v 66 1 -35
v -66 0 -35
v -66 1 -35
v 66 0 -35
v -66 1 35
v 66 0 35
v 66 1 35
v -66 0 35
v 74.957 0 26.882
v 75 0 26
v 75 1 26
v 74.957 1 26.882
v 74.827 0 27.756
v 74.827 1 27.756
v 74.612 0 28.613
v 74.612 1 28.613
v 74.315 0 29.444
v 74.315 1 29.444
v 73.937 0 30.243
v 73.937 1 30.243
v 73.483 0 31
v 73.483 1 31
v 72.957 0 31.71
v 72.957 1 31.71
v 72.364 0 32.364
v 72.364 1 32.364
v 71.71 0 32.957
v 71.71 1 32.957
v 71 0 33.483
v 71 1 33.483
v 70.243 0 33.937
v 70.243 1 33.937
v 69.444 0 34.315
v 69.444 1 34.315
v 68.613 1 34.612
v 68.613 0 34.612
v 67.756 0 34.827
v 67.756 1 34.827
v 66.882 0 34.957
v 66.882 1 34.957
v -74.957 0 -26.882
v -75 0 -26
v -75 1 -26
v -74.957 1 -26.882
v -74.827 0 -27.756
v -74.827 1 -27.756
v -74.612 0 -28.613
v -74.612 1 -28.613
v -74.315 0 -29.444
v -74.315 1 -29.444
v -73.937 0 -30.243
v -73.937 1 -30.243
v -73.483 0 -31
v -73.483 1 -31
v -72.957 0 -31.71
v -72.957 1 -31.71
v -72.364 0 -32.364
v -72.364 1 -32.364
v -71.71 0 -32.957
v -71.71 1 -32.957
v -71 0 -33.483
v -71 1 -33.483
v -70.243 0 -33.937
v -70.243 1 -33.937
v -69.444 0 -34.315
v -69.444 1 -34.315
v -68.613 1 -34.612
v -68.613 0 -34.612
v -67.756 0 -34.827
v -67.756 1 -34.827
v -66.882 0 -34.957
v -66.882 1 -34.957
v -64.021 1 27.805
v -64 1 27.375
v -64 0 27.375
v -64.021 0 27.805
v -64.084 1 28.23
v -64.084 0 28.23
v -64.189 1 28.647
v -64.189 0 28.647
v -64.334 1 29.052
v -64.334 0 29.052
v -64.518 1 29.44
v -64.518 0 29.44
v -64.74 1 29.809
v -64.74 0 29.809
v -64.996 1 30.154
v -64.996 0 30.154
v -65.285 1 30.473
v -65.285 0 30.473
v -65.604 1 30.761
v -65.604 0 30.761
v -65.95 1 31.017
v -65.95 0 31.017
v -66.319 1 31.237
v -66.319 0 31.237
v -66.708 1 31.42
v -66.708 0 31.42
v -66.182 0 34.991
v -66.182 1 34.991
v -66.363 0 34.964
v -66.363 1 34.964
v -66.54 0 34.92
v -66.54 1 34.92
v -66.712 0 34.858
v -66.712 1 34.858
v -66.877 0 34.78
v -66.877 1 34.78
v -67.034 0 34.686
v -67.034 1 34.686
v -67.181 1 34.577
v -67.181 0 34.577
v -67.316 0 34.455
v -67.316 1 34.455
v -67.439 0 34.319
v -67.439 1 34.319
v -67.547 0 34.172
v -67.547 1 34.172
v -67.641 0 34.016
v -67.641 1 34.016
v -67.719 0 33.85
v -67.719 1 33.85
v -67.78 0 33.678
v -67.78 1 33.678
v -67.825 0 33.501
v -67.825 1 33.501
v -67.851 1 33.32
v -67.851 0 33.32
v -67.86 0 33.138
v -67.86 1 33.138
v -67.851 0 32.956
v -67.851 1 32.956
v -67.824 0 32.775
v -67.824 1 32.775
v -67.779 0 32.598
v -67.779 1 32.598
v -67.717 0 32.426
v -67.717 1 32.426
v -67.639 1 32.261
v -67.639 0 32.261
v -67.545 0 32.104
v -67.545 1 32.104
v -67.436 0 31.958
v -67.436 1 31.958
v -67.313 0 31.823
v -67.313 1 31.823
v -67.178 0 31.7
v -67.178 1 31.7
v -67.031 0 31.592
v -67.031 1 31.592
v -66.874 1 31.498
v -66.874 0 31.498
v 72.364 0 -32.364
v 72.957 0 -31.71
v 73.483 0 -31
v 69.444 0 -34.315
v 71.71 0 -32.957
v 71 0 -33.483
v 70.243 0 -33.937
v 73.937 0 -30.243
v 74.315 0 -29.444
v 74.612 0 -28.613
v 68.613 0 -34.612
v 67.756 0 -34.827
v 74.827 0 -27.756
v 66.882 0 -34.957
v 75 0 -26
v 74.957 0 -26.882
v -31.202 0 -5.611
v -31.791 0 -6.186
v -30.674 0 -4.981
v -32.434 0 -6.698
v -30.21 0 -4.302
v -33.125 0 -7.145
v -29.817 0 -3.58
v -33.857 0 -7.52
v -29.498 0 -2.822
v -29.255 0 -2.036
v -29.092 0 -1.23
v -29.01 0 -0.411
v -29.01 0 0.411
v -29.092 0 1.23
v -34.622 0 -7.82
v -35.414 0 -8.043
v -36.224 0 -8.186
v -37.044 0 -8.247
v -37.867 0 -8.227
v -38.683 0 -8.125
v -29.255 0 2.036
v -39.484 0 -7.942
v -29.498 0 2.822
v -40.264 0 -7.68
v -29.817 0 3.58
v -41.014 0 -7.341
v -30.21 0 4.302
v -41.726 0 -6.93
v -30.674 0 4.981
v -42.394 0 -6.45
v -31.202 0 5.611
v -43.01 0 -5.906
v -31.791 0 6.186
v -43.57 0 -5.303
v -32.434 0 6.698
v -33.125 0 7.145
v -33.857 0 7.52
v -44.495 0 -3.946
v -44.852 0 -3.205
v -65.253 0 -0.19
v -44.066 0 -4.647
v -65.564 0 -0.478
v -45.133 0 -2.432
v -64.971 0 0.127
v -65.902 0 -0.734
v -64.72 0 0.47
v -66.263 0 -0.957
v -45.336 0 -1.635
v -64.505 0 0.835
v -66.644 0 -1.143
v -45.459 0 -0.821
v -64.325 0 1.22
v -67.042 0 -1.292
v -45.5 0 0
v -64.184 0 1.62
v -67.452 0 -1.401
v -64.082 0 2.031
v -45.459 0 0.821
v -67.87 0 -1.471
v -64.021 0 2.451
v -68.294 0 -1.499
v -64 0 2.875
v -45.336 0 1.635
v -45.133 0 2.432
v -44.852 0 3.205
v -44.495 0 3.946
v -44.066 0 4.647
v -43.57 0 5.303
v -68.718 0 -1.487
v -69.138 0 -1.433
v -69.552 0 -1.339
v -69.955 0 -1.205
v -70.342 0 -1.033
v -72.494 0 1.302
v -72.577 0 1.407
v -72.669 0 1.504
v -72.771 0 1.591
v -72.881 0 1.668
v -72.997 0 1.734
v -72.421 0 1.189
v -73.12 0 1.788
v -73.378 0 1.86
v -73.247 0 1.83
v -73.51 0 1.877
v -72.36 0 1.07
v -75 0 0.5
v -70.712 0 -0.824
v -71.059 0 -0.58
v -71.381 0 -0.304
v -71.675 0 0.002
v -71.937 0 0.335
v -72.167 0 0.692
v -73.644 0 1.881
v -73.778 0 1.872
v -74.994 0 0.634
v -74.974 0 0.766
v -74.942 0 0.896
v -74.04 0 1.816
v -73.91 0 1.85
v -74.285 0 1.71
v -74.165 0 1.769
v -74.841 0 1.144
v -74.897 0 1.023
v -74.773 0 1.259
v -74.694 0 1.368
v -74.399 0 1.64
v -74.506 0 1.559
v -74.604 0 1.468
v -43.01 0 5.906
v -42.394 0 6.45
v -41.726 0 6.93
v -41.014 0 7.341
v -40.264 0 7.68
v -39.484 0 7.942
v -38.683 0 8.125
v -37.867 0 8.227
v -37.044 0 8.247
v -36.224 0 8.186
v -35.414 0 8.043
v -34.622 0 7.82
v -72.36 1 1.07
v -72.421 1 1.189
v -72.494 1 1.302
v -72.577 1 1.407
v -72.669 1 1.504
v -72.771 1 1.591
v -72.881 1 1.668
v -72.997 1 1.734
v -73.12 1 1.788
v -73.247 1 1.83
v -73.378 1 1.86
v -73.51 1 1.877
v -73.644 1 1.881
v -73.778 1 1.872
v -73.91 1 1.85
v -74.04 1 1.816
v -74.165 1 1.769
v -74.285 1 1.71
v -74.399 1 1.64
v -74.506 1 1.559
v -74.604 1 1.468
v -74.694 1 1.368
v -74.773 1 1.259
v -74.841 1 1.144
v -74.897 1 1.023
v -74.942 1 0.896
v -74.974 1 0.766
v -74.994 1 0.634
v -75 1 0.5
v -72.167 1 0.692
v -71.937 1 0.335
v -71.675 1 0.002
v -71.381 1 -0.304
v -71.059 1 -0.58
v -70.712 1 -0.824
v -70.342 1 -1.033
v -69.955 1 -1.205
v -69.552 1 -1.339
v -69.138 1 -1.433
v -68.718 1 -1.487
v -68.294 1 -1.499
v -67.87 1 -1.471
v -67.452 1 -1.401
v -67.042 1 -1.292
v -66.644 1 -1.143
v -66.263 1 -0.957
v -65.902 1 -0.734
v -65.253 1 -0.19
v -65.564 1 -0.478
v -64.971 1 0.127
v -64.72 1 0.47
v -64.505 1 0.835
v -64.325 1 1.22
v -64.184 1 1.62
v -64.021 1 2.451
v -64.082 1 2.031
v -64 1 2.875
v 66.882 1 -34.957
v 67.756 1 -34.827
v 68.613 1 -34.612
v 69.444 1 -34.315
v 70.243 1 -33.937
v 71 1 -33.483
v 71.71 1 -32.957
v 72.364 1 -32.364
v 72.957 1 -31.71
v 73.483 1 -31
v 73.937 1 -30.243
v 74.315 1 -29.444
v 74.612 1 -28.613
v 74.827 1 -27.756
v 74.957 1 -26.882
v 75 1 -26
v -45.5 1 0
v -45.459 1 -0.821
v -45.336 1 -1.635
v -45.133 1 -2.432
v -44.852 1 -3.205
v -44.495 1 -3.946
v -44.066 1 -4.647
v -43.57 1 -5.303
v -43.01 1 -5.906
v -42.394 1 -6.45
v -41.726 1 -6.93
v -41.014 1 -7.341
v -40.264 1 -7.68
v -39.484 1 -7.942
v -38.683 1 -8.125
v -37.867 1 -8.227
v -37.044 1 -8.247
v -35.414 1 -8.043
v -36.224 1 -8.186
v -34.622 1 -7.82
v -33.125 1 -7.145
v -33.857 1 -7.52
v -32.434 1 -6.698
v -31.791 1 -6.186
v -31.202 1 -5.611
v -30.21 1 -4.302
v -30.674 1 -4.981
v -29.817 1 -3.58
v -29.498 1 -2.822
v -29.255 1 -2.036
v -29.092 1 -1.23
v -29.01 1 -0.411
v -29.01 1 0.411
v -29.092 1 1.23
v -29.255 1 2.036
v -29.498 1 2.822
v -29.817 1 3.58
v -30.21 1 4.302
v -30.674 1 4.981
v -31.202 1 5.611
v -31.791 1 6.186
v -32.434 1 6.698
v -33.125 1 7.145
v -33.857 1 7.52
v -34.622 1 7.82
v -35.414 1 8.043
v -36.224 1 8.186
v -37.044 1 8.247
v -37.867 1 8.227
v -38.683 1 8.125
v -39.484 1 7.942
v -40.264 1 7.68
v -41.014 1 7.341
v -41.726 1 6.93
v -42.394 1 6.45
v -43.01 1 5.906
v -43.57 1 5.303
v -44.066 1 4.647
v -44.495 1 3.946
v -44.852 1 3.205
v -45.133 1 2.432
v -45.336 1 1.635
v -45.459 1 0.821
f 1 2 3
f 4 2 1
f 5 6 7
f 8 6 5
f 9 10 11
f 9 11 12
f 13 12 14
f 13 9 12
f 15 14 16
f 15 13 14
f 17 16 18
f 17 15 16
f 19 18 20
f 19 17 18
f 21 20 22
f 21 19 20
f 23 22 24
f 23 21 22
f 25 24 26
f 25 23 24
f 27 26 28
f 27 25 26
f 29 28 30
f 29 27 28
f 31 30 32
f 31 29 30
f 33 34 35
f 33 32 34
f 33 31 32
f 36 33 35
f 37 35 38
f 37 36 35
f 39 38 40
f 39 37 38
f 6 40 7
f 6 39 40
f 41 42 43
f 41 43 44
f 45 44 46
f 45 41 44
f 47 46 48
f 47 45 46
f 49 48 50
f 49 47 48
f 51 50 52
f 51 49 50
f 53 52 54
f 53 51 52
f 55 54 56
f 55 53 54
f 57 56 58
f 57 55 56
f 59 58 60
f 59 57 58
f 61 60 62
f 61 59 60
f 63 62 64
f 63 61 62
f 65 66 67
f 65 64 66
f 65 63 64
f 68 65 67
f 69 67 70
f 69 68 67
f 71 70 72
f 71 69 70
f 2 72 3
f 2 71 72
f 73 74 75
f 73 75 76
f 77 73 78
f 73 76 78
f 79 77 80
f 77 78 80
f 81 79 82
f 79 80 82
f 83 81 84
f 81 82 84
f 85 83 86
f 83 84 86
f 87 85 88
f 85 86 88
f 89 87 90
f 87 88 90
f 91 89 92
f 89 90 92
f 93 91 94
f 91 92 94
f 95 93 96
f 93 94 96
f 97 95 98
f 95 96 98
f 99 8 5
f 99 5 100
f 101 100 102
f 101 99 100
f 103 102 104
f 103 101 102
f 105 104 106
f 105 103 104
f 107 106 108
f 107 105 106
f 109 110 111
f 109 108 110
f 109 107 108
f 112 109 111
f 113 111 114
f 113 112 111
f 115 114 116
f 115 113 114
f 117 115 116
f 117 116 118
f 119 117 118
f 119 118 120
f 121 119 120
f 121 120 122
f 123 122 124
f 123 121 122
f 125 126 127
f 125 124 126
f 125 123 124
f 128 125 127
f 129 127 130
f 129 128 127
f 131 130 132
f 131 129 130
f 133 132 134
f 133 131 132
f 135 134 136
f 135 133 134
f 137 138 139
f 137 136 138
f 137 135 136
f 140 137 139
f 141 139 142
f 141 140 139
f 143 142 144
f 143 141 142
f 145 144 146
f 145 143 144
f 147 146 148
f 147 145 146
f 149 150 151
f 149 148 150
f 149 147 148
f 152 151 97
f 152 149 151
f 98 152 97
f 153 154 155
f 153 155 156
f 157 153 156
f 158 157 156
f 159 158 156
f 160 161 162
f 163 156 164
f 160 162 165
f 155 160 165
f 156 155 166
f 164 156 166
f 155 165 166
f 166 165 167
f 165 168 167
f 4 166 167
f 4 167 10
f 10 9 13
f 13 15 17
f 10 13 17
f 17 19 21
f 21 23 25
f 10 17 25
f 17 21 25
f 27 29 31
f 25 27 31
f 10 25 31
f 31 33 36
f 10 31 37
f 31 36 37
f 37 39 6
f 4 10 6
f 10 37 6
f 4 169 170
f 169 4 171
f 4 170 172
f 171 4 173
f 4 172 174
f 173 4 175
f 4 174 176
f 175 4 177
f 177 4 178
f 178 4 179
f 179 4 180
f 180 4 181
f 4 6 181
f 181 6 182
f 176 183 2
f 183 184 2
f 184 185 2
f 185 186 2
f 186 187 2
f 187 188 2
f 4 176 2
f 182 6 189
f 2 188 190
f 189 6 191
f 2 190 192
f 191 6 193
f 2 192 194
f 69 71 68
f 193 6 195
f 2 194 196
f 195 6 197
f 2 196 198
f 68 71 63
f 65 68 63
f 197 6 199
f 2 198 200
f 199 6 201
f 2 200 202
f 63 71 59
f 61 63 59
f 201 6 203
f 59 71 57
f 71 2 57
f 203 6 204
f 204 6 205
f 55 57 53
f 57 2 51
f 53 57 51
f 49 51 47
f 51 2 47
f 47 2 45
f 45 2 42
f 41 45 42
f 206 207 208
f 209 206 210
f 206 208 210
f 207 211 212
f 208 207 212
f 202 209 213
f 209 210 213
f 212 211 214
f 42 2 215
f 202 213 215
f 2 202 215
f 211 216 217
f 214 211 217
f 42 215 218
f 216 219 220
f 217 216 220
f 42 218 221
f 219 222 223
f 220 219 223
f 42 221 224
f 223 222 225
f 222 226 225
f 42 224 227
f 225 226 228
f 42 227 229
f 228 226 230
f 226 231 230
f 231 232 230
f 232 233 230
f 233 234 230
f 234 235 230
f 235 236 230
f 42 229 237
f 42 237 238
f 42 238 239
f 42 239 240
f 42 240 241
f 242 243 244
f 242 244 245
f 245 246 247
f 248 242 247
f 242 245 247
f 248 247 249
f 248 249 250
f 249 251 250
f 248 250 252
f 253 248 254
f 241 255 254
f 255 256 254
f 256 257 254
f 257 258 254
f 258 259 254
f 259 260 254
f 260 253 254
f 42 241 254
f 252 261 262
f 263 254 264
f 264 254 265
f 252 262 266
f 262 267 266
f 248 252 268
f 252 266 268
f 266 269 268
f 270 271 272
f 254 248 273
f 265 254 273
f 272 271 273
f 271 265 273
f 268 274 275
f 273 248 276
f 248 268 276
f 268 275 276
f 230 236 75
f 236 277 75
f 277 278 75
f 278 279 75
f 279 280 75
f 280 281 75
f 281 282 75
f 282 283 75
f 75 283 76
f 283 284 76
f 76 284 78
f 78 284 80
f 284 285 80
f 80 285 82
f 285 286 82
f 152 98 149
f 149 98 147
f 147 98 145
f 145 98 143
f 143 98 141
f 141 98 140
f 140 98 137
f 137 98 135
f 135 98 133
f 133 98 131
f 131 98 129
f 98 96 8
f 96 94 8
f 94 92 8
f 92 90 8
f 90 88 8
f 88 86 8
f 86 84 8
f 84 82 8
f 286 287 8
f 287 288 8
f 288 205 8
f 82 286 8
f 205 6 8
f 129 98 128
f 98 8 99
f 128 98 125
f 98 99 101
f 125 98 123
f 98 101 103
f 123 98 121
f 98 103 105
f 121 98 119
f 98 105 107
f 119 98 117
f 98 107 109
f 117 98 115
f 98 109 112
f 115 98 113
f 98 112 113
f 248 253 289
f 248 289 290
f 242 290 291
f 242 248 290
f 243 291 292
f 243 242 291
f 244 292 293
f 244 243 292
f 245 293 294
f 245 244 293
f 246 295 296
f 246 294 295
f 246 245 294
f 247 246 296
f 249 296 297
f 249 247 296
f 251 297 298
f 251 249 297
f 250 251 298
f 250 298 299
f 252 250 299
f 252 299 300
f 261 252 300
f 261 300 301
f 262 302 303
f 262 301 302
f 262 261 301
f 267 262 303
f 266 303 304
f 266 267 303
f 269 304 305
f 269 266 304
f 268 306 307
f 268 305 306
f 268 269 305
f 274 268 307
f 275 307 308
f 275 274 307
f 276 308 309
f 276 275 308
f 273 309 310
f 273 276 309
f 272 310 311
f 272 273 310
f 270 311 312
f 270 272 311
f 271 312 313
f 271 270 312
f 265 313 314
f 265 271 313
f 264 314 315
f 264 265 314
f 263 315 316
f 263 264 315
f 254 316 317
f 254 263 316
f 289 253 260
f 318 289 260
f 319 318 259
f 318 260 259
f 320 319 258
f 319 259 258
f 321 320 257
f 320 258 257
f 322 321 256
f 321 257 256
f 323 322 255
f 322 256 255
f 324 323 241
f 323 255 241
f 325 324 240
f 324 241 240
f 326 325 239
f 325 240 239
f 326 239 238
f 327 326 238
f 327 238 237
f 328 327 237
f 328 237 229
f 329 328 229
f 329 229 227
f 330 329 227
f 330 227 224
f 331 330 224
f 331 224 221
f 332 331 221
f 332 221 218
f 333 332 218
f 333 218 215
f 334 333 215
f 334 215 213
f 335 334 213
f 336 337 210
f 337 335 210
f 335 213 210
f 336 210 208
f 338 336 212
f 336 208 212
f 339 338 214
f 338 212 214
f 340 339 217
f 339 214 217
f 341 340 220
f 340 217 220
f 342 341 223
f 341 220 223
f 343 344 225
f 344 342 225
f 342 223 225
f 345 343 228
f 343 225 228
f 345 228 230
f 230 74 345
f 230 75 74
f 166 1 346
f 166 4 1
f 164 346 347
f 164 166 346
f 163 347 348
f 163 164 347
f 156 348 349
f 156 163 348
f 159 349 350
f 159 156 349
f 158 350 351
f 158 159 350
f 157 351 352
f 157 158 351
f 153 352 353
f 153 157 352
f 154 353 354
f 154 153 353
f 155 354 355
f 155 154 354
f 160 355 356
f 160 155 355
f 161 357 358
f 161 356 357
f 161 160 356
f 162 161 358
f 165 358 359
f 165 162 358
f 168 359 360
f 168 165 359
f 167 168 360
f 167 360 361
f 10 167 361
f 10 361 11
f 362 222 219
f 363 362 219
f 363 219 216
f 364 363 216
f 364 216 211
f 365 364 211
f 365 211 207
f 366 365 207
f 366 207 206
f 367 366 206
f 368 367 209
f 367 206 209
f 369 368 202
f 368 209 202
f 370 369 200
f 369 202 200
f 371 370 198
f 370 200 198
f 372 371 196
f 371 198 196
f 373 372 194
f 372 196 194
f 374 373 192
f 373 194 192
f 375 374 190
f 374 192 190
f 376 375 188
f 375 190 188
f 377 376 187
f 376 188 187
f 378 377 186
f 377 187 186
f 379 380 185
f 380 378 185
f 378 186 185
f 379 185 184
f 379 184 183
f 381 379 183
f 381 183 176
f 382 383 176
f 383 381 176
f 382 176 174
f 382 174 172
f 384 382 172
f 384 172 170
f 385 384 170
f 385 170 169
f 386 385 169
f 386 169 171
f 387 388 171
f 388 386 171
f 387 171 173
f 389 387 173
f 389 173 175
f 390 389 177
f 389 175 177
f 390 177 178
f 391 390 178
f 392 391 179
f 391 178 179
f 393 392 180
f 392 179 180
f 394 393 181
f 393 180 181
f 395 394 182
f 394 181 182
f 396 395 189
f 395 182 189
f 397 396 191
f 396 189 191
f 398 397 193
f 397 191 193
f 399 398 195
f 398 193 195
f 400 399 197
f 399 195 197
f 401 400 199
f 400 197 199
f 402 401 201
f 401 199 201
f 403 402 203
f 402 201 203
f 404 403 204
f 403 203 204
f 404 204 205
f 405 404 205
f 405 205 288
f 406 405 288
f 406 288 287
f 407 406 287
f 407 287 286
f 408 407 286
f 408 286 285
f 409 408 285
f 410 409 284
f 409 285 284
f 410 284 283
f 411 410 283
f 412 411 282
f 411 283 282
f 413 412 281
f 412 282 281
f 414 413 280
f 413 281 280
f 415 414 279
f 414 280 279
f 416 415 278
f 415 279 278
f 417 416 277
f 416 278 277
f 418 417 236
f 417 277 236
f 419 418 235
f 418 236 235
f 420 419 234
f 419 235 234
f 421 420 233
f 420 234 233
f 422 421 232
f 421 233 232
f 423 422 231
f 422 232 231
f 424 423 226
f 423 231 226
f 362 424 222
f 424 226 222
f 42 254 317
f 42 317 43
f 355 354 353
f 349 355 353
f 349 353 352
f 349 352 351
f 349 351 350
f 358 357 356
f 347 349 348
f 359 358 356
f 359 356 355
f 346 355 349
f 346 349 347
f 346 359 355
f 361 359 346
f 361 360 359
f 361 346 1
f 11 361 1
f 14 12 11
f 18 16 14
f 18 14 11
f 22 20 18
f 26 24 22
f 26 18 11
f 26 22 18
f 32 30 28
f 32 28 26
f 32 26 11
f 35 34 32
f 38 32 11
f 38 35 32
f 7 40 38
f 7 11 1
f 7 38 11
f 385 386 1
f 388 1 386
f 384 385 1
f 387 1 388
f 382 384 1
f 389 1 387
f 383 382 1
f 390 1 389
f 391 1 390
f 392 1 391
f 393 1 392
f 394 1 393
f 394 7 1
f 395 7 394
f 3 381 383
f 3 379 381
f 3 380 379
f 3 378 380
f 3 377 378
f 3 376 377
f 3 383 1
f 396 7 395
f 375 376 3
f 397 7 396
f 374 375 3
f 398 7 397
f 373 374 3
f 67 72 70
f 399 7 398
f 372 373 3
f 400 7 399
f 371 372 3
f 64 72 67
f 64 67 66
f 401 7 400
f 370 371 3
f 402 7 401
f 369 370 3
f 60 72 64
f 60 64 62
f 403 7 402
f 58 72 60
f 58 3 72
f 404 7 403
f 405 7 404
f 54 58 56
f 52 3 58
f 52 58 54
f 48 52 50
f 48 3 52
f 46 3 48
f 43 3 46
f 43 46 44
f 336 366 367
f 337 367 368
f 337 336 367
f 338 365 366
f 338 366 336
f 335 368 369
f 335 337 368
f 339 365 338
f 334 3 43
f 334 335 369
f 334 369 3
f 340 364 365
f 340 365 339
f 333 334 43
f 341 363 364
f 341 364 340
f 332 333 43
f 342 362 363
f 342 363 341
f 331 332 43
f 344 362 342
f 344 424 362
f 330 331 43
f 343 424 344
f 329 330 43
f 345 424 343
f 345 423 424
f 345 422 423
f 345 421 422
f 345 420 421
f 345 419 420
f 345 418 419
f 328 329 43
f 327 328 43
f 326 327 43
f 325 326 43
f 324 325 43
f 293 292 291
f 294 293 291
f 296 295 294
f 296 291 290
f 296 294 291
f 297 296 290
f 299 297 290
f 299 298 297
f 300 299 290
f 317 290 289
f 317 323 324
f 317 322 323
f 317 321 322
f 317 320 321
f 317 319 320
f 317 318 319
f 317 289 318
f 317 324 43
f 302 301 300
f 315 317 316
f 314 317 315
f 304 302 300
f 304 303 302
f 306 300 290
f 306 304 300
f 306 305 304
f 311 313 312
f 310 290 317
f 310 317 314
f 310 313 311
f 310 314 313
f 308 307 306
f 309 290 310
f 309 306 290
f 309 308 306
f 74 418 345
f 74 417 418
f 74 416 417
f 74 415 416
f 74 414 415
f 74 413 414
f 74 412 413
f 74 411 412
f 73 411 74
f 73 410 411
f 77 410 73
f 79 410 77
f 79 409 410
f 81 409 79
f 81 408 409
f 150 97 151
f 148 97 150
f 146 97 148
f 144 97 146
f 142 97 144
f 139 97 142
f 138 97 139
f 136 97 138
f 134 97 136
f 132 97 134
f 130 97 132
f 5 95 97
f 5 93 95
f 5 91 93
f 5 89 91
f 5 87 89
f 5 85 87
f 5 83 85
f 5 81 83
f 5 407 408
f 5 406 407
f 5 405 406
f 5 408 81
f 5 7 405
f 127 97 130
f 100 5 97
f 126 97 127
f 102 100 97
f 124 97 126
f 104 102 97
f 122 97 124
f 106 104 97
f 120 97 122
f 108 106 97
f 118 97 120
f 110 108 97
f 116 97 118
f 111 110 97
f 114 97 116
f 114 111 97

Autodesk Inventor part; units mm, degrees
ref_plane "YZ Plane" through (0, 0, 0) normal (1, 0, 0) x (0, 1, 0)
ref_plane "XZ Plane" through (0, 0, 0) normal (0, 1, 0) x (-1, 0, 0)
ref_plane "XY Plane" through (0, 0, 0) normal (0, 0, 1) x (1, 0, 0)
sketch "Sketch1" plane through (0, 0, 0) normal (0, 1, 0) x (-1, 0, 0)
  line L0 (-75, 35) -> (-66, 35) construction
  line L1 (75, 35) -> (75, 26) construction
  line L2 (75, -35) -> (66, -35) construction
  line L3 (-75, -35) -> (-75, -26) construction
  line L4 (-75, 35) -> (75, -35) construction
  line L5 (75, 35) -> (-75, -35) construction
  arc A0 (75, 26) -> (66, 35) centre (66, 26) ccw construction
  arc A1 (66, -35) -> (75, -26) centre (66, -26) ccw
  arc A2 (-75, -26) -> (-66, -35) centre (-66, -26) ccw
  arc A3 (-66, 35) -> (-75, 26) centre (-66, 26) ccw
  line L6 (75, 26) -> (75, 0.5) construction
  line L7 (66, 35) -> (75, 35) construction
  line L8 (-66, 35) -> (66, 35)
  line L9 (-75, 26) -> (-75, 35) construction
  line L10 (-75, -26) -> (-75, 26)
  line L11 (-66, -35) -> (-75, -35) construction
  line L12 (66, -35) -> (-66, -35)
  line L13 (75, -26) -> (75, -35) construction
  circle A4 centre (37.25, 0) radius 8.25
  line L14 (64, 27.375) -> (64, 2.875)
  arc A5 (66.7085, 31.4202) -> (66, 35) centre (66, 33.14) ccw
  arc A6 (64, 2.875) -> (72.3603, 1.0699) centre (68.375, 2.875) ccw
  arc A7 (75, 0.5) -> (72.3603, 1.0699) centre (73.6186, 0.5) ccw
  line L15 (66, 35) -> (66, 35) construction
  line L16 (75, 0.5) -> (75, -26)
  arc A8 (66.7085, 31.4202) -> (64, 27.375) centre (68.375, 27.375) ccw
  point P0 (0, 0)
  point P1 (0, 0)
  dimension "d3" = 70
  dimension "d4" = 150
  dimension "d5" = 16.5
  dimension "d6" = 29.5
  dimension "d7" = 11
  dimension "d10" = 4.375
  dimension "d14" = 36.5
  dimension "d15" = 3.25
  dimension "d17" = 2.375
  dimension "d19" = 9
  dimension "d21" = 2.375
extrude "Extrusion1" add sketch "Sketch1" along normal blind 1
properties part number "Google Pixel - Clear Case Cutout"
